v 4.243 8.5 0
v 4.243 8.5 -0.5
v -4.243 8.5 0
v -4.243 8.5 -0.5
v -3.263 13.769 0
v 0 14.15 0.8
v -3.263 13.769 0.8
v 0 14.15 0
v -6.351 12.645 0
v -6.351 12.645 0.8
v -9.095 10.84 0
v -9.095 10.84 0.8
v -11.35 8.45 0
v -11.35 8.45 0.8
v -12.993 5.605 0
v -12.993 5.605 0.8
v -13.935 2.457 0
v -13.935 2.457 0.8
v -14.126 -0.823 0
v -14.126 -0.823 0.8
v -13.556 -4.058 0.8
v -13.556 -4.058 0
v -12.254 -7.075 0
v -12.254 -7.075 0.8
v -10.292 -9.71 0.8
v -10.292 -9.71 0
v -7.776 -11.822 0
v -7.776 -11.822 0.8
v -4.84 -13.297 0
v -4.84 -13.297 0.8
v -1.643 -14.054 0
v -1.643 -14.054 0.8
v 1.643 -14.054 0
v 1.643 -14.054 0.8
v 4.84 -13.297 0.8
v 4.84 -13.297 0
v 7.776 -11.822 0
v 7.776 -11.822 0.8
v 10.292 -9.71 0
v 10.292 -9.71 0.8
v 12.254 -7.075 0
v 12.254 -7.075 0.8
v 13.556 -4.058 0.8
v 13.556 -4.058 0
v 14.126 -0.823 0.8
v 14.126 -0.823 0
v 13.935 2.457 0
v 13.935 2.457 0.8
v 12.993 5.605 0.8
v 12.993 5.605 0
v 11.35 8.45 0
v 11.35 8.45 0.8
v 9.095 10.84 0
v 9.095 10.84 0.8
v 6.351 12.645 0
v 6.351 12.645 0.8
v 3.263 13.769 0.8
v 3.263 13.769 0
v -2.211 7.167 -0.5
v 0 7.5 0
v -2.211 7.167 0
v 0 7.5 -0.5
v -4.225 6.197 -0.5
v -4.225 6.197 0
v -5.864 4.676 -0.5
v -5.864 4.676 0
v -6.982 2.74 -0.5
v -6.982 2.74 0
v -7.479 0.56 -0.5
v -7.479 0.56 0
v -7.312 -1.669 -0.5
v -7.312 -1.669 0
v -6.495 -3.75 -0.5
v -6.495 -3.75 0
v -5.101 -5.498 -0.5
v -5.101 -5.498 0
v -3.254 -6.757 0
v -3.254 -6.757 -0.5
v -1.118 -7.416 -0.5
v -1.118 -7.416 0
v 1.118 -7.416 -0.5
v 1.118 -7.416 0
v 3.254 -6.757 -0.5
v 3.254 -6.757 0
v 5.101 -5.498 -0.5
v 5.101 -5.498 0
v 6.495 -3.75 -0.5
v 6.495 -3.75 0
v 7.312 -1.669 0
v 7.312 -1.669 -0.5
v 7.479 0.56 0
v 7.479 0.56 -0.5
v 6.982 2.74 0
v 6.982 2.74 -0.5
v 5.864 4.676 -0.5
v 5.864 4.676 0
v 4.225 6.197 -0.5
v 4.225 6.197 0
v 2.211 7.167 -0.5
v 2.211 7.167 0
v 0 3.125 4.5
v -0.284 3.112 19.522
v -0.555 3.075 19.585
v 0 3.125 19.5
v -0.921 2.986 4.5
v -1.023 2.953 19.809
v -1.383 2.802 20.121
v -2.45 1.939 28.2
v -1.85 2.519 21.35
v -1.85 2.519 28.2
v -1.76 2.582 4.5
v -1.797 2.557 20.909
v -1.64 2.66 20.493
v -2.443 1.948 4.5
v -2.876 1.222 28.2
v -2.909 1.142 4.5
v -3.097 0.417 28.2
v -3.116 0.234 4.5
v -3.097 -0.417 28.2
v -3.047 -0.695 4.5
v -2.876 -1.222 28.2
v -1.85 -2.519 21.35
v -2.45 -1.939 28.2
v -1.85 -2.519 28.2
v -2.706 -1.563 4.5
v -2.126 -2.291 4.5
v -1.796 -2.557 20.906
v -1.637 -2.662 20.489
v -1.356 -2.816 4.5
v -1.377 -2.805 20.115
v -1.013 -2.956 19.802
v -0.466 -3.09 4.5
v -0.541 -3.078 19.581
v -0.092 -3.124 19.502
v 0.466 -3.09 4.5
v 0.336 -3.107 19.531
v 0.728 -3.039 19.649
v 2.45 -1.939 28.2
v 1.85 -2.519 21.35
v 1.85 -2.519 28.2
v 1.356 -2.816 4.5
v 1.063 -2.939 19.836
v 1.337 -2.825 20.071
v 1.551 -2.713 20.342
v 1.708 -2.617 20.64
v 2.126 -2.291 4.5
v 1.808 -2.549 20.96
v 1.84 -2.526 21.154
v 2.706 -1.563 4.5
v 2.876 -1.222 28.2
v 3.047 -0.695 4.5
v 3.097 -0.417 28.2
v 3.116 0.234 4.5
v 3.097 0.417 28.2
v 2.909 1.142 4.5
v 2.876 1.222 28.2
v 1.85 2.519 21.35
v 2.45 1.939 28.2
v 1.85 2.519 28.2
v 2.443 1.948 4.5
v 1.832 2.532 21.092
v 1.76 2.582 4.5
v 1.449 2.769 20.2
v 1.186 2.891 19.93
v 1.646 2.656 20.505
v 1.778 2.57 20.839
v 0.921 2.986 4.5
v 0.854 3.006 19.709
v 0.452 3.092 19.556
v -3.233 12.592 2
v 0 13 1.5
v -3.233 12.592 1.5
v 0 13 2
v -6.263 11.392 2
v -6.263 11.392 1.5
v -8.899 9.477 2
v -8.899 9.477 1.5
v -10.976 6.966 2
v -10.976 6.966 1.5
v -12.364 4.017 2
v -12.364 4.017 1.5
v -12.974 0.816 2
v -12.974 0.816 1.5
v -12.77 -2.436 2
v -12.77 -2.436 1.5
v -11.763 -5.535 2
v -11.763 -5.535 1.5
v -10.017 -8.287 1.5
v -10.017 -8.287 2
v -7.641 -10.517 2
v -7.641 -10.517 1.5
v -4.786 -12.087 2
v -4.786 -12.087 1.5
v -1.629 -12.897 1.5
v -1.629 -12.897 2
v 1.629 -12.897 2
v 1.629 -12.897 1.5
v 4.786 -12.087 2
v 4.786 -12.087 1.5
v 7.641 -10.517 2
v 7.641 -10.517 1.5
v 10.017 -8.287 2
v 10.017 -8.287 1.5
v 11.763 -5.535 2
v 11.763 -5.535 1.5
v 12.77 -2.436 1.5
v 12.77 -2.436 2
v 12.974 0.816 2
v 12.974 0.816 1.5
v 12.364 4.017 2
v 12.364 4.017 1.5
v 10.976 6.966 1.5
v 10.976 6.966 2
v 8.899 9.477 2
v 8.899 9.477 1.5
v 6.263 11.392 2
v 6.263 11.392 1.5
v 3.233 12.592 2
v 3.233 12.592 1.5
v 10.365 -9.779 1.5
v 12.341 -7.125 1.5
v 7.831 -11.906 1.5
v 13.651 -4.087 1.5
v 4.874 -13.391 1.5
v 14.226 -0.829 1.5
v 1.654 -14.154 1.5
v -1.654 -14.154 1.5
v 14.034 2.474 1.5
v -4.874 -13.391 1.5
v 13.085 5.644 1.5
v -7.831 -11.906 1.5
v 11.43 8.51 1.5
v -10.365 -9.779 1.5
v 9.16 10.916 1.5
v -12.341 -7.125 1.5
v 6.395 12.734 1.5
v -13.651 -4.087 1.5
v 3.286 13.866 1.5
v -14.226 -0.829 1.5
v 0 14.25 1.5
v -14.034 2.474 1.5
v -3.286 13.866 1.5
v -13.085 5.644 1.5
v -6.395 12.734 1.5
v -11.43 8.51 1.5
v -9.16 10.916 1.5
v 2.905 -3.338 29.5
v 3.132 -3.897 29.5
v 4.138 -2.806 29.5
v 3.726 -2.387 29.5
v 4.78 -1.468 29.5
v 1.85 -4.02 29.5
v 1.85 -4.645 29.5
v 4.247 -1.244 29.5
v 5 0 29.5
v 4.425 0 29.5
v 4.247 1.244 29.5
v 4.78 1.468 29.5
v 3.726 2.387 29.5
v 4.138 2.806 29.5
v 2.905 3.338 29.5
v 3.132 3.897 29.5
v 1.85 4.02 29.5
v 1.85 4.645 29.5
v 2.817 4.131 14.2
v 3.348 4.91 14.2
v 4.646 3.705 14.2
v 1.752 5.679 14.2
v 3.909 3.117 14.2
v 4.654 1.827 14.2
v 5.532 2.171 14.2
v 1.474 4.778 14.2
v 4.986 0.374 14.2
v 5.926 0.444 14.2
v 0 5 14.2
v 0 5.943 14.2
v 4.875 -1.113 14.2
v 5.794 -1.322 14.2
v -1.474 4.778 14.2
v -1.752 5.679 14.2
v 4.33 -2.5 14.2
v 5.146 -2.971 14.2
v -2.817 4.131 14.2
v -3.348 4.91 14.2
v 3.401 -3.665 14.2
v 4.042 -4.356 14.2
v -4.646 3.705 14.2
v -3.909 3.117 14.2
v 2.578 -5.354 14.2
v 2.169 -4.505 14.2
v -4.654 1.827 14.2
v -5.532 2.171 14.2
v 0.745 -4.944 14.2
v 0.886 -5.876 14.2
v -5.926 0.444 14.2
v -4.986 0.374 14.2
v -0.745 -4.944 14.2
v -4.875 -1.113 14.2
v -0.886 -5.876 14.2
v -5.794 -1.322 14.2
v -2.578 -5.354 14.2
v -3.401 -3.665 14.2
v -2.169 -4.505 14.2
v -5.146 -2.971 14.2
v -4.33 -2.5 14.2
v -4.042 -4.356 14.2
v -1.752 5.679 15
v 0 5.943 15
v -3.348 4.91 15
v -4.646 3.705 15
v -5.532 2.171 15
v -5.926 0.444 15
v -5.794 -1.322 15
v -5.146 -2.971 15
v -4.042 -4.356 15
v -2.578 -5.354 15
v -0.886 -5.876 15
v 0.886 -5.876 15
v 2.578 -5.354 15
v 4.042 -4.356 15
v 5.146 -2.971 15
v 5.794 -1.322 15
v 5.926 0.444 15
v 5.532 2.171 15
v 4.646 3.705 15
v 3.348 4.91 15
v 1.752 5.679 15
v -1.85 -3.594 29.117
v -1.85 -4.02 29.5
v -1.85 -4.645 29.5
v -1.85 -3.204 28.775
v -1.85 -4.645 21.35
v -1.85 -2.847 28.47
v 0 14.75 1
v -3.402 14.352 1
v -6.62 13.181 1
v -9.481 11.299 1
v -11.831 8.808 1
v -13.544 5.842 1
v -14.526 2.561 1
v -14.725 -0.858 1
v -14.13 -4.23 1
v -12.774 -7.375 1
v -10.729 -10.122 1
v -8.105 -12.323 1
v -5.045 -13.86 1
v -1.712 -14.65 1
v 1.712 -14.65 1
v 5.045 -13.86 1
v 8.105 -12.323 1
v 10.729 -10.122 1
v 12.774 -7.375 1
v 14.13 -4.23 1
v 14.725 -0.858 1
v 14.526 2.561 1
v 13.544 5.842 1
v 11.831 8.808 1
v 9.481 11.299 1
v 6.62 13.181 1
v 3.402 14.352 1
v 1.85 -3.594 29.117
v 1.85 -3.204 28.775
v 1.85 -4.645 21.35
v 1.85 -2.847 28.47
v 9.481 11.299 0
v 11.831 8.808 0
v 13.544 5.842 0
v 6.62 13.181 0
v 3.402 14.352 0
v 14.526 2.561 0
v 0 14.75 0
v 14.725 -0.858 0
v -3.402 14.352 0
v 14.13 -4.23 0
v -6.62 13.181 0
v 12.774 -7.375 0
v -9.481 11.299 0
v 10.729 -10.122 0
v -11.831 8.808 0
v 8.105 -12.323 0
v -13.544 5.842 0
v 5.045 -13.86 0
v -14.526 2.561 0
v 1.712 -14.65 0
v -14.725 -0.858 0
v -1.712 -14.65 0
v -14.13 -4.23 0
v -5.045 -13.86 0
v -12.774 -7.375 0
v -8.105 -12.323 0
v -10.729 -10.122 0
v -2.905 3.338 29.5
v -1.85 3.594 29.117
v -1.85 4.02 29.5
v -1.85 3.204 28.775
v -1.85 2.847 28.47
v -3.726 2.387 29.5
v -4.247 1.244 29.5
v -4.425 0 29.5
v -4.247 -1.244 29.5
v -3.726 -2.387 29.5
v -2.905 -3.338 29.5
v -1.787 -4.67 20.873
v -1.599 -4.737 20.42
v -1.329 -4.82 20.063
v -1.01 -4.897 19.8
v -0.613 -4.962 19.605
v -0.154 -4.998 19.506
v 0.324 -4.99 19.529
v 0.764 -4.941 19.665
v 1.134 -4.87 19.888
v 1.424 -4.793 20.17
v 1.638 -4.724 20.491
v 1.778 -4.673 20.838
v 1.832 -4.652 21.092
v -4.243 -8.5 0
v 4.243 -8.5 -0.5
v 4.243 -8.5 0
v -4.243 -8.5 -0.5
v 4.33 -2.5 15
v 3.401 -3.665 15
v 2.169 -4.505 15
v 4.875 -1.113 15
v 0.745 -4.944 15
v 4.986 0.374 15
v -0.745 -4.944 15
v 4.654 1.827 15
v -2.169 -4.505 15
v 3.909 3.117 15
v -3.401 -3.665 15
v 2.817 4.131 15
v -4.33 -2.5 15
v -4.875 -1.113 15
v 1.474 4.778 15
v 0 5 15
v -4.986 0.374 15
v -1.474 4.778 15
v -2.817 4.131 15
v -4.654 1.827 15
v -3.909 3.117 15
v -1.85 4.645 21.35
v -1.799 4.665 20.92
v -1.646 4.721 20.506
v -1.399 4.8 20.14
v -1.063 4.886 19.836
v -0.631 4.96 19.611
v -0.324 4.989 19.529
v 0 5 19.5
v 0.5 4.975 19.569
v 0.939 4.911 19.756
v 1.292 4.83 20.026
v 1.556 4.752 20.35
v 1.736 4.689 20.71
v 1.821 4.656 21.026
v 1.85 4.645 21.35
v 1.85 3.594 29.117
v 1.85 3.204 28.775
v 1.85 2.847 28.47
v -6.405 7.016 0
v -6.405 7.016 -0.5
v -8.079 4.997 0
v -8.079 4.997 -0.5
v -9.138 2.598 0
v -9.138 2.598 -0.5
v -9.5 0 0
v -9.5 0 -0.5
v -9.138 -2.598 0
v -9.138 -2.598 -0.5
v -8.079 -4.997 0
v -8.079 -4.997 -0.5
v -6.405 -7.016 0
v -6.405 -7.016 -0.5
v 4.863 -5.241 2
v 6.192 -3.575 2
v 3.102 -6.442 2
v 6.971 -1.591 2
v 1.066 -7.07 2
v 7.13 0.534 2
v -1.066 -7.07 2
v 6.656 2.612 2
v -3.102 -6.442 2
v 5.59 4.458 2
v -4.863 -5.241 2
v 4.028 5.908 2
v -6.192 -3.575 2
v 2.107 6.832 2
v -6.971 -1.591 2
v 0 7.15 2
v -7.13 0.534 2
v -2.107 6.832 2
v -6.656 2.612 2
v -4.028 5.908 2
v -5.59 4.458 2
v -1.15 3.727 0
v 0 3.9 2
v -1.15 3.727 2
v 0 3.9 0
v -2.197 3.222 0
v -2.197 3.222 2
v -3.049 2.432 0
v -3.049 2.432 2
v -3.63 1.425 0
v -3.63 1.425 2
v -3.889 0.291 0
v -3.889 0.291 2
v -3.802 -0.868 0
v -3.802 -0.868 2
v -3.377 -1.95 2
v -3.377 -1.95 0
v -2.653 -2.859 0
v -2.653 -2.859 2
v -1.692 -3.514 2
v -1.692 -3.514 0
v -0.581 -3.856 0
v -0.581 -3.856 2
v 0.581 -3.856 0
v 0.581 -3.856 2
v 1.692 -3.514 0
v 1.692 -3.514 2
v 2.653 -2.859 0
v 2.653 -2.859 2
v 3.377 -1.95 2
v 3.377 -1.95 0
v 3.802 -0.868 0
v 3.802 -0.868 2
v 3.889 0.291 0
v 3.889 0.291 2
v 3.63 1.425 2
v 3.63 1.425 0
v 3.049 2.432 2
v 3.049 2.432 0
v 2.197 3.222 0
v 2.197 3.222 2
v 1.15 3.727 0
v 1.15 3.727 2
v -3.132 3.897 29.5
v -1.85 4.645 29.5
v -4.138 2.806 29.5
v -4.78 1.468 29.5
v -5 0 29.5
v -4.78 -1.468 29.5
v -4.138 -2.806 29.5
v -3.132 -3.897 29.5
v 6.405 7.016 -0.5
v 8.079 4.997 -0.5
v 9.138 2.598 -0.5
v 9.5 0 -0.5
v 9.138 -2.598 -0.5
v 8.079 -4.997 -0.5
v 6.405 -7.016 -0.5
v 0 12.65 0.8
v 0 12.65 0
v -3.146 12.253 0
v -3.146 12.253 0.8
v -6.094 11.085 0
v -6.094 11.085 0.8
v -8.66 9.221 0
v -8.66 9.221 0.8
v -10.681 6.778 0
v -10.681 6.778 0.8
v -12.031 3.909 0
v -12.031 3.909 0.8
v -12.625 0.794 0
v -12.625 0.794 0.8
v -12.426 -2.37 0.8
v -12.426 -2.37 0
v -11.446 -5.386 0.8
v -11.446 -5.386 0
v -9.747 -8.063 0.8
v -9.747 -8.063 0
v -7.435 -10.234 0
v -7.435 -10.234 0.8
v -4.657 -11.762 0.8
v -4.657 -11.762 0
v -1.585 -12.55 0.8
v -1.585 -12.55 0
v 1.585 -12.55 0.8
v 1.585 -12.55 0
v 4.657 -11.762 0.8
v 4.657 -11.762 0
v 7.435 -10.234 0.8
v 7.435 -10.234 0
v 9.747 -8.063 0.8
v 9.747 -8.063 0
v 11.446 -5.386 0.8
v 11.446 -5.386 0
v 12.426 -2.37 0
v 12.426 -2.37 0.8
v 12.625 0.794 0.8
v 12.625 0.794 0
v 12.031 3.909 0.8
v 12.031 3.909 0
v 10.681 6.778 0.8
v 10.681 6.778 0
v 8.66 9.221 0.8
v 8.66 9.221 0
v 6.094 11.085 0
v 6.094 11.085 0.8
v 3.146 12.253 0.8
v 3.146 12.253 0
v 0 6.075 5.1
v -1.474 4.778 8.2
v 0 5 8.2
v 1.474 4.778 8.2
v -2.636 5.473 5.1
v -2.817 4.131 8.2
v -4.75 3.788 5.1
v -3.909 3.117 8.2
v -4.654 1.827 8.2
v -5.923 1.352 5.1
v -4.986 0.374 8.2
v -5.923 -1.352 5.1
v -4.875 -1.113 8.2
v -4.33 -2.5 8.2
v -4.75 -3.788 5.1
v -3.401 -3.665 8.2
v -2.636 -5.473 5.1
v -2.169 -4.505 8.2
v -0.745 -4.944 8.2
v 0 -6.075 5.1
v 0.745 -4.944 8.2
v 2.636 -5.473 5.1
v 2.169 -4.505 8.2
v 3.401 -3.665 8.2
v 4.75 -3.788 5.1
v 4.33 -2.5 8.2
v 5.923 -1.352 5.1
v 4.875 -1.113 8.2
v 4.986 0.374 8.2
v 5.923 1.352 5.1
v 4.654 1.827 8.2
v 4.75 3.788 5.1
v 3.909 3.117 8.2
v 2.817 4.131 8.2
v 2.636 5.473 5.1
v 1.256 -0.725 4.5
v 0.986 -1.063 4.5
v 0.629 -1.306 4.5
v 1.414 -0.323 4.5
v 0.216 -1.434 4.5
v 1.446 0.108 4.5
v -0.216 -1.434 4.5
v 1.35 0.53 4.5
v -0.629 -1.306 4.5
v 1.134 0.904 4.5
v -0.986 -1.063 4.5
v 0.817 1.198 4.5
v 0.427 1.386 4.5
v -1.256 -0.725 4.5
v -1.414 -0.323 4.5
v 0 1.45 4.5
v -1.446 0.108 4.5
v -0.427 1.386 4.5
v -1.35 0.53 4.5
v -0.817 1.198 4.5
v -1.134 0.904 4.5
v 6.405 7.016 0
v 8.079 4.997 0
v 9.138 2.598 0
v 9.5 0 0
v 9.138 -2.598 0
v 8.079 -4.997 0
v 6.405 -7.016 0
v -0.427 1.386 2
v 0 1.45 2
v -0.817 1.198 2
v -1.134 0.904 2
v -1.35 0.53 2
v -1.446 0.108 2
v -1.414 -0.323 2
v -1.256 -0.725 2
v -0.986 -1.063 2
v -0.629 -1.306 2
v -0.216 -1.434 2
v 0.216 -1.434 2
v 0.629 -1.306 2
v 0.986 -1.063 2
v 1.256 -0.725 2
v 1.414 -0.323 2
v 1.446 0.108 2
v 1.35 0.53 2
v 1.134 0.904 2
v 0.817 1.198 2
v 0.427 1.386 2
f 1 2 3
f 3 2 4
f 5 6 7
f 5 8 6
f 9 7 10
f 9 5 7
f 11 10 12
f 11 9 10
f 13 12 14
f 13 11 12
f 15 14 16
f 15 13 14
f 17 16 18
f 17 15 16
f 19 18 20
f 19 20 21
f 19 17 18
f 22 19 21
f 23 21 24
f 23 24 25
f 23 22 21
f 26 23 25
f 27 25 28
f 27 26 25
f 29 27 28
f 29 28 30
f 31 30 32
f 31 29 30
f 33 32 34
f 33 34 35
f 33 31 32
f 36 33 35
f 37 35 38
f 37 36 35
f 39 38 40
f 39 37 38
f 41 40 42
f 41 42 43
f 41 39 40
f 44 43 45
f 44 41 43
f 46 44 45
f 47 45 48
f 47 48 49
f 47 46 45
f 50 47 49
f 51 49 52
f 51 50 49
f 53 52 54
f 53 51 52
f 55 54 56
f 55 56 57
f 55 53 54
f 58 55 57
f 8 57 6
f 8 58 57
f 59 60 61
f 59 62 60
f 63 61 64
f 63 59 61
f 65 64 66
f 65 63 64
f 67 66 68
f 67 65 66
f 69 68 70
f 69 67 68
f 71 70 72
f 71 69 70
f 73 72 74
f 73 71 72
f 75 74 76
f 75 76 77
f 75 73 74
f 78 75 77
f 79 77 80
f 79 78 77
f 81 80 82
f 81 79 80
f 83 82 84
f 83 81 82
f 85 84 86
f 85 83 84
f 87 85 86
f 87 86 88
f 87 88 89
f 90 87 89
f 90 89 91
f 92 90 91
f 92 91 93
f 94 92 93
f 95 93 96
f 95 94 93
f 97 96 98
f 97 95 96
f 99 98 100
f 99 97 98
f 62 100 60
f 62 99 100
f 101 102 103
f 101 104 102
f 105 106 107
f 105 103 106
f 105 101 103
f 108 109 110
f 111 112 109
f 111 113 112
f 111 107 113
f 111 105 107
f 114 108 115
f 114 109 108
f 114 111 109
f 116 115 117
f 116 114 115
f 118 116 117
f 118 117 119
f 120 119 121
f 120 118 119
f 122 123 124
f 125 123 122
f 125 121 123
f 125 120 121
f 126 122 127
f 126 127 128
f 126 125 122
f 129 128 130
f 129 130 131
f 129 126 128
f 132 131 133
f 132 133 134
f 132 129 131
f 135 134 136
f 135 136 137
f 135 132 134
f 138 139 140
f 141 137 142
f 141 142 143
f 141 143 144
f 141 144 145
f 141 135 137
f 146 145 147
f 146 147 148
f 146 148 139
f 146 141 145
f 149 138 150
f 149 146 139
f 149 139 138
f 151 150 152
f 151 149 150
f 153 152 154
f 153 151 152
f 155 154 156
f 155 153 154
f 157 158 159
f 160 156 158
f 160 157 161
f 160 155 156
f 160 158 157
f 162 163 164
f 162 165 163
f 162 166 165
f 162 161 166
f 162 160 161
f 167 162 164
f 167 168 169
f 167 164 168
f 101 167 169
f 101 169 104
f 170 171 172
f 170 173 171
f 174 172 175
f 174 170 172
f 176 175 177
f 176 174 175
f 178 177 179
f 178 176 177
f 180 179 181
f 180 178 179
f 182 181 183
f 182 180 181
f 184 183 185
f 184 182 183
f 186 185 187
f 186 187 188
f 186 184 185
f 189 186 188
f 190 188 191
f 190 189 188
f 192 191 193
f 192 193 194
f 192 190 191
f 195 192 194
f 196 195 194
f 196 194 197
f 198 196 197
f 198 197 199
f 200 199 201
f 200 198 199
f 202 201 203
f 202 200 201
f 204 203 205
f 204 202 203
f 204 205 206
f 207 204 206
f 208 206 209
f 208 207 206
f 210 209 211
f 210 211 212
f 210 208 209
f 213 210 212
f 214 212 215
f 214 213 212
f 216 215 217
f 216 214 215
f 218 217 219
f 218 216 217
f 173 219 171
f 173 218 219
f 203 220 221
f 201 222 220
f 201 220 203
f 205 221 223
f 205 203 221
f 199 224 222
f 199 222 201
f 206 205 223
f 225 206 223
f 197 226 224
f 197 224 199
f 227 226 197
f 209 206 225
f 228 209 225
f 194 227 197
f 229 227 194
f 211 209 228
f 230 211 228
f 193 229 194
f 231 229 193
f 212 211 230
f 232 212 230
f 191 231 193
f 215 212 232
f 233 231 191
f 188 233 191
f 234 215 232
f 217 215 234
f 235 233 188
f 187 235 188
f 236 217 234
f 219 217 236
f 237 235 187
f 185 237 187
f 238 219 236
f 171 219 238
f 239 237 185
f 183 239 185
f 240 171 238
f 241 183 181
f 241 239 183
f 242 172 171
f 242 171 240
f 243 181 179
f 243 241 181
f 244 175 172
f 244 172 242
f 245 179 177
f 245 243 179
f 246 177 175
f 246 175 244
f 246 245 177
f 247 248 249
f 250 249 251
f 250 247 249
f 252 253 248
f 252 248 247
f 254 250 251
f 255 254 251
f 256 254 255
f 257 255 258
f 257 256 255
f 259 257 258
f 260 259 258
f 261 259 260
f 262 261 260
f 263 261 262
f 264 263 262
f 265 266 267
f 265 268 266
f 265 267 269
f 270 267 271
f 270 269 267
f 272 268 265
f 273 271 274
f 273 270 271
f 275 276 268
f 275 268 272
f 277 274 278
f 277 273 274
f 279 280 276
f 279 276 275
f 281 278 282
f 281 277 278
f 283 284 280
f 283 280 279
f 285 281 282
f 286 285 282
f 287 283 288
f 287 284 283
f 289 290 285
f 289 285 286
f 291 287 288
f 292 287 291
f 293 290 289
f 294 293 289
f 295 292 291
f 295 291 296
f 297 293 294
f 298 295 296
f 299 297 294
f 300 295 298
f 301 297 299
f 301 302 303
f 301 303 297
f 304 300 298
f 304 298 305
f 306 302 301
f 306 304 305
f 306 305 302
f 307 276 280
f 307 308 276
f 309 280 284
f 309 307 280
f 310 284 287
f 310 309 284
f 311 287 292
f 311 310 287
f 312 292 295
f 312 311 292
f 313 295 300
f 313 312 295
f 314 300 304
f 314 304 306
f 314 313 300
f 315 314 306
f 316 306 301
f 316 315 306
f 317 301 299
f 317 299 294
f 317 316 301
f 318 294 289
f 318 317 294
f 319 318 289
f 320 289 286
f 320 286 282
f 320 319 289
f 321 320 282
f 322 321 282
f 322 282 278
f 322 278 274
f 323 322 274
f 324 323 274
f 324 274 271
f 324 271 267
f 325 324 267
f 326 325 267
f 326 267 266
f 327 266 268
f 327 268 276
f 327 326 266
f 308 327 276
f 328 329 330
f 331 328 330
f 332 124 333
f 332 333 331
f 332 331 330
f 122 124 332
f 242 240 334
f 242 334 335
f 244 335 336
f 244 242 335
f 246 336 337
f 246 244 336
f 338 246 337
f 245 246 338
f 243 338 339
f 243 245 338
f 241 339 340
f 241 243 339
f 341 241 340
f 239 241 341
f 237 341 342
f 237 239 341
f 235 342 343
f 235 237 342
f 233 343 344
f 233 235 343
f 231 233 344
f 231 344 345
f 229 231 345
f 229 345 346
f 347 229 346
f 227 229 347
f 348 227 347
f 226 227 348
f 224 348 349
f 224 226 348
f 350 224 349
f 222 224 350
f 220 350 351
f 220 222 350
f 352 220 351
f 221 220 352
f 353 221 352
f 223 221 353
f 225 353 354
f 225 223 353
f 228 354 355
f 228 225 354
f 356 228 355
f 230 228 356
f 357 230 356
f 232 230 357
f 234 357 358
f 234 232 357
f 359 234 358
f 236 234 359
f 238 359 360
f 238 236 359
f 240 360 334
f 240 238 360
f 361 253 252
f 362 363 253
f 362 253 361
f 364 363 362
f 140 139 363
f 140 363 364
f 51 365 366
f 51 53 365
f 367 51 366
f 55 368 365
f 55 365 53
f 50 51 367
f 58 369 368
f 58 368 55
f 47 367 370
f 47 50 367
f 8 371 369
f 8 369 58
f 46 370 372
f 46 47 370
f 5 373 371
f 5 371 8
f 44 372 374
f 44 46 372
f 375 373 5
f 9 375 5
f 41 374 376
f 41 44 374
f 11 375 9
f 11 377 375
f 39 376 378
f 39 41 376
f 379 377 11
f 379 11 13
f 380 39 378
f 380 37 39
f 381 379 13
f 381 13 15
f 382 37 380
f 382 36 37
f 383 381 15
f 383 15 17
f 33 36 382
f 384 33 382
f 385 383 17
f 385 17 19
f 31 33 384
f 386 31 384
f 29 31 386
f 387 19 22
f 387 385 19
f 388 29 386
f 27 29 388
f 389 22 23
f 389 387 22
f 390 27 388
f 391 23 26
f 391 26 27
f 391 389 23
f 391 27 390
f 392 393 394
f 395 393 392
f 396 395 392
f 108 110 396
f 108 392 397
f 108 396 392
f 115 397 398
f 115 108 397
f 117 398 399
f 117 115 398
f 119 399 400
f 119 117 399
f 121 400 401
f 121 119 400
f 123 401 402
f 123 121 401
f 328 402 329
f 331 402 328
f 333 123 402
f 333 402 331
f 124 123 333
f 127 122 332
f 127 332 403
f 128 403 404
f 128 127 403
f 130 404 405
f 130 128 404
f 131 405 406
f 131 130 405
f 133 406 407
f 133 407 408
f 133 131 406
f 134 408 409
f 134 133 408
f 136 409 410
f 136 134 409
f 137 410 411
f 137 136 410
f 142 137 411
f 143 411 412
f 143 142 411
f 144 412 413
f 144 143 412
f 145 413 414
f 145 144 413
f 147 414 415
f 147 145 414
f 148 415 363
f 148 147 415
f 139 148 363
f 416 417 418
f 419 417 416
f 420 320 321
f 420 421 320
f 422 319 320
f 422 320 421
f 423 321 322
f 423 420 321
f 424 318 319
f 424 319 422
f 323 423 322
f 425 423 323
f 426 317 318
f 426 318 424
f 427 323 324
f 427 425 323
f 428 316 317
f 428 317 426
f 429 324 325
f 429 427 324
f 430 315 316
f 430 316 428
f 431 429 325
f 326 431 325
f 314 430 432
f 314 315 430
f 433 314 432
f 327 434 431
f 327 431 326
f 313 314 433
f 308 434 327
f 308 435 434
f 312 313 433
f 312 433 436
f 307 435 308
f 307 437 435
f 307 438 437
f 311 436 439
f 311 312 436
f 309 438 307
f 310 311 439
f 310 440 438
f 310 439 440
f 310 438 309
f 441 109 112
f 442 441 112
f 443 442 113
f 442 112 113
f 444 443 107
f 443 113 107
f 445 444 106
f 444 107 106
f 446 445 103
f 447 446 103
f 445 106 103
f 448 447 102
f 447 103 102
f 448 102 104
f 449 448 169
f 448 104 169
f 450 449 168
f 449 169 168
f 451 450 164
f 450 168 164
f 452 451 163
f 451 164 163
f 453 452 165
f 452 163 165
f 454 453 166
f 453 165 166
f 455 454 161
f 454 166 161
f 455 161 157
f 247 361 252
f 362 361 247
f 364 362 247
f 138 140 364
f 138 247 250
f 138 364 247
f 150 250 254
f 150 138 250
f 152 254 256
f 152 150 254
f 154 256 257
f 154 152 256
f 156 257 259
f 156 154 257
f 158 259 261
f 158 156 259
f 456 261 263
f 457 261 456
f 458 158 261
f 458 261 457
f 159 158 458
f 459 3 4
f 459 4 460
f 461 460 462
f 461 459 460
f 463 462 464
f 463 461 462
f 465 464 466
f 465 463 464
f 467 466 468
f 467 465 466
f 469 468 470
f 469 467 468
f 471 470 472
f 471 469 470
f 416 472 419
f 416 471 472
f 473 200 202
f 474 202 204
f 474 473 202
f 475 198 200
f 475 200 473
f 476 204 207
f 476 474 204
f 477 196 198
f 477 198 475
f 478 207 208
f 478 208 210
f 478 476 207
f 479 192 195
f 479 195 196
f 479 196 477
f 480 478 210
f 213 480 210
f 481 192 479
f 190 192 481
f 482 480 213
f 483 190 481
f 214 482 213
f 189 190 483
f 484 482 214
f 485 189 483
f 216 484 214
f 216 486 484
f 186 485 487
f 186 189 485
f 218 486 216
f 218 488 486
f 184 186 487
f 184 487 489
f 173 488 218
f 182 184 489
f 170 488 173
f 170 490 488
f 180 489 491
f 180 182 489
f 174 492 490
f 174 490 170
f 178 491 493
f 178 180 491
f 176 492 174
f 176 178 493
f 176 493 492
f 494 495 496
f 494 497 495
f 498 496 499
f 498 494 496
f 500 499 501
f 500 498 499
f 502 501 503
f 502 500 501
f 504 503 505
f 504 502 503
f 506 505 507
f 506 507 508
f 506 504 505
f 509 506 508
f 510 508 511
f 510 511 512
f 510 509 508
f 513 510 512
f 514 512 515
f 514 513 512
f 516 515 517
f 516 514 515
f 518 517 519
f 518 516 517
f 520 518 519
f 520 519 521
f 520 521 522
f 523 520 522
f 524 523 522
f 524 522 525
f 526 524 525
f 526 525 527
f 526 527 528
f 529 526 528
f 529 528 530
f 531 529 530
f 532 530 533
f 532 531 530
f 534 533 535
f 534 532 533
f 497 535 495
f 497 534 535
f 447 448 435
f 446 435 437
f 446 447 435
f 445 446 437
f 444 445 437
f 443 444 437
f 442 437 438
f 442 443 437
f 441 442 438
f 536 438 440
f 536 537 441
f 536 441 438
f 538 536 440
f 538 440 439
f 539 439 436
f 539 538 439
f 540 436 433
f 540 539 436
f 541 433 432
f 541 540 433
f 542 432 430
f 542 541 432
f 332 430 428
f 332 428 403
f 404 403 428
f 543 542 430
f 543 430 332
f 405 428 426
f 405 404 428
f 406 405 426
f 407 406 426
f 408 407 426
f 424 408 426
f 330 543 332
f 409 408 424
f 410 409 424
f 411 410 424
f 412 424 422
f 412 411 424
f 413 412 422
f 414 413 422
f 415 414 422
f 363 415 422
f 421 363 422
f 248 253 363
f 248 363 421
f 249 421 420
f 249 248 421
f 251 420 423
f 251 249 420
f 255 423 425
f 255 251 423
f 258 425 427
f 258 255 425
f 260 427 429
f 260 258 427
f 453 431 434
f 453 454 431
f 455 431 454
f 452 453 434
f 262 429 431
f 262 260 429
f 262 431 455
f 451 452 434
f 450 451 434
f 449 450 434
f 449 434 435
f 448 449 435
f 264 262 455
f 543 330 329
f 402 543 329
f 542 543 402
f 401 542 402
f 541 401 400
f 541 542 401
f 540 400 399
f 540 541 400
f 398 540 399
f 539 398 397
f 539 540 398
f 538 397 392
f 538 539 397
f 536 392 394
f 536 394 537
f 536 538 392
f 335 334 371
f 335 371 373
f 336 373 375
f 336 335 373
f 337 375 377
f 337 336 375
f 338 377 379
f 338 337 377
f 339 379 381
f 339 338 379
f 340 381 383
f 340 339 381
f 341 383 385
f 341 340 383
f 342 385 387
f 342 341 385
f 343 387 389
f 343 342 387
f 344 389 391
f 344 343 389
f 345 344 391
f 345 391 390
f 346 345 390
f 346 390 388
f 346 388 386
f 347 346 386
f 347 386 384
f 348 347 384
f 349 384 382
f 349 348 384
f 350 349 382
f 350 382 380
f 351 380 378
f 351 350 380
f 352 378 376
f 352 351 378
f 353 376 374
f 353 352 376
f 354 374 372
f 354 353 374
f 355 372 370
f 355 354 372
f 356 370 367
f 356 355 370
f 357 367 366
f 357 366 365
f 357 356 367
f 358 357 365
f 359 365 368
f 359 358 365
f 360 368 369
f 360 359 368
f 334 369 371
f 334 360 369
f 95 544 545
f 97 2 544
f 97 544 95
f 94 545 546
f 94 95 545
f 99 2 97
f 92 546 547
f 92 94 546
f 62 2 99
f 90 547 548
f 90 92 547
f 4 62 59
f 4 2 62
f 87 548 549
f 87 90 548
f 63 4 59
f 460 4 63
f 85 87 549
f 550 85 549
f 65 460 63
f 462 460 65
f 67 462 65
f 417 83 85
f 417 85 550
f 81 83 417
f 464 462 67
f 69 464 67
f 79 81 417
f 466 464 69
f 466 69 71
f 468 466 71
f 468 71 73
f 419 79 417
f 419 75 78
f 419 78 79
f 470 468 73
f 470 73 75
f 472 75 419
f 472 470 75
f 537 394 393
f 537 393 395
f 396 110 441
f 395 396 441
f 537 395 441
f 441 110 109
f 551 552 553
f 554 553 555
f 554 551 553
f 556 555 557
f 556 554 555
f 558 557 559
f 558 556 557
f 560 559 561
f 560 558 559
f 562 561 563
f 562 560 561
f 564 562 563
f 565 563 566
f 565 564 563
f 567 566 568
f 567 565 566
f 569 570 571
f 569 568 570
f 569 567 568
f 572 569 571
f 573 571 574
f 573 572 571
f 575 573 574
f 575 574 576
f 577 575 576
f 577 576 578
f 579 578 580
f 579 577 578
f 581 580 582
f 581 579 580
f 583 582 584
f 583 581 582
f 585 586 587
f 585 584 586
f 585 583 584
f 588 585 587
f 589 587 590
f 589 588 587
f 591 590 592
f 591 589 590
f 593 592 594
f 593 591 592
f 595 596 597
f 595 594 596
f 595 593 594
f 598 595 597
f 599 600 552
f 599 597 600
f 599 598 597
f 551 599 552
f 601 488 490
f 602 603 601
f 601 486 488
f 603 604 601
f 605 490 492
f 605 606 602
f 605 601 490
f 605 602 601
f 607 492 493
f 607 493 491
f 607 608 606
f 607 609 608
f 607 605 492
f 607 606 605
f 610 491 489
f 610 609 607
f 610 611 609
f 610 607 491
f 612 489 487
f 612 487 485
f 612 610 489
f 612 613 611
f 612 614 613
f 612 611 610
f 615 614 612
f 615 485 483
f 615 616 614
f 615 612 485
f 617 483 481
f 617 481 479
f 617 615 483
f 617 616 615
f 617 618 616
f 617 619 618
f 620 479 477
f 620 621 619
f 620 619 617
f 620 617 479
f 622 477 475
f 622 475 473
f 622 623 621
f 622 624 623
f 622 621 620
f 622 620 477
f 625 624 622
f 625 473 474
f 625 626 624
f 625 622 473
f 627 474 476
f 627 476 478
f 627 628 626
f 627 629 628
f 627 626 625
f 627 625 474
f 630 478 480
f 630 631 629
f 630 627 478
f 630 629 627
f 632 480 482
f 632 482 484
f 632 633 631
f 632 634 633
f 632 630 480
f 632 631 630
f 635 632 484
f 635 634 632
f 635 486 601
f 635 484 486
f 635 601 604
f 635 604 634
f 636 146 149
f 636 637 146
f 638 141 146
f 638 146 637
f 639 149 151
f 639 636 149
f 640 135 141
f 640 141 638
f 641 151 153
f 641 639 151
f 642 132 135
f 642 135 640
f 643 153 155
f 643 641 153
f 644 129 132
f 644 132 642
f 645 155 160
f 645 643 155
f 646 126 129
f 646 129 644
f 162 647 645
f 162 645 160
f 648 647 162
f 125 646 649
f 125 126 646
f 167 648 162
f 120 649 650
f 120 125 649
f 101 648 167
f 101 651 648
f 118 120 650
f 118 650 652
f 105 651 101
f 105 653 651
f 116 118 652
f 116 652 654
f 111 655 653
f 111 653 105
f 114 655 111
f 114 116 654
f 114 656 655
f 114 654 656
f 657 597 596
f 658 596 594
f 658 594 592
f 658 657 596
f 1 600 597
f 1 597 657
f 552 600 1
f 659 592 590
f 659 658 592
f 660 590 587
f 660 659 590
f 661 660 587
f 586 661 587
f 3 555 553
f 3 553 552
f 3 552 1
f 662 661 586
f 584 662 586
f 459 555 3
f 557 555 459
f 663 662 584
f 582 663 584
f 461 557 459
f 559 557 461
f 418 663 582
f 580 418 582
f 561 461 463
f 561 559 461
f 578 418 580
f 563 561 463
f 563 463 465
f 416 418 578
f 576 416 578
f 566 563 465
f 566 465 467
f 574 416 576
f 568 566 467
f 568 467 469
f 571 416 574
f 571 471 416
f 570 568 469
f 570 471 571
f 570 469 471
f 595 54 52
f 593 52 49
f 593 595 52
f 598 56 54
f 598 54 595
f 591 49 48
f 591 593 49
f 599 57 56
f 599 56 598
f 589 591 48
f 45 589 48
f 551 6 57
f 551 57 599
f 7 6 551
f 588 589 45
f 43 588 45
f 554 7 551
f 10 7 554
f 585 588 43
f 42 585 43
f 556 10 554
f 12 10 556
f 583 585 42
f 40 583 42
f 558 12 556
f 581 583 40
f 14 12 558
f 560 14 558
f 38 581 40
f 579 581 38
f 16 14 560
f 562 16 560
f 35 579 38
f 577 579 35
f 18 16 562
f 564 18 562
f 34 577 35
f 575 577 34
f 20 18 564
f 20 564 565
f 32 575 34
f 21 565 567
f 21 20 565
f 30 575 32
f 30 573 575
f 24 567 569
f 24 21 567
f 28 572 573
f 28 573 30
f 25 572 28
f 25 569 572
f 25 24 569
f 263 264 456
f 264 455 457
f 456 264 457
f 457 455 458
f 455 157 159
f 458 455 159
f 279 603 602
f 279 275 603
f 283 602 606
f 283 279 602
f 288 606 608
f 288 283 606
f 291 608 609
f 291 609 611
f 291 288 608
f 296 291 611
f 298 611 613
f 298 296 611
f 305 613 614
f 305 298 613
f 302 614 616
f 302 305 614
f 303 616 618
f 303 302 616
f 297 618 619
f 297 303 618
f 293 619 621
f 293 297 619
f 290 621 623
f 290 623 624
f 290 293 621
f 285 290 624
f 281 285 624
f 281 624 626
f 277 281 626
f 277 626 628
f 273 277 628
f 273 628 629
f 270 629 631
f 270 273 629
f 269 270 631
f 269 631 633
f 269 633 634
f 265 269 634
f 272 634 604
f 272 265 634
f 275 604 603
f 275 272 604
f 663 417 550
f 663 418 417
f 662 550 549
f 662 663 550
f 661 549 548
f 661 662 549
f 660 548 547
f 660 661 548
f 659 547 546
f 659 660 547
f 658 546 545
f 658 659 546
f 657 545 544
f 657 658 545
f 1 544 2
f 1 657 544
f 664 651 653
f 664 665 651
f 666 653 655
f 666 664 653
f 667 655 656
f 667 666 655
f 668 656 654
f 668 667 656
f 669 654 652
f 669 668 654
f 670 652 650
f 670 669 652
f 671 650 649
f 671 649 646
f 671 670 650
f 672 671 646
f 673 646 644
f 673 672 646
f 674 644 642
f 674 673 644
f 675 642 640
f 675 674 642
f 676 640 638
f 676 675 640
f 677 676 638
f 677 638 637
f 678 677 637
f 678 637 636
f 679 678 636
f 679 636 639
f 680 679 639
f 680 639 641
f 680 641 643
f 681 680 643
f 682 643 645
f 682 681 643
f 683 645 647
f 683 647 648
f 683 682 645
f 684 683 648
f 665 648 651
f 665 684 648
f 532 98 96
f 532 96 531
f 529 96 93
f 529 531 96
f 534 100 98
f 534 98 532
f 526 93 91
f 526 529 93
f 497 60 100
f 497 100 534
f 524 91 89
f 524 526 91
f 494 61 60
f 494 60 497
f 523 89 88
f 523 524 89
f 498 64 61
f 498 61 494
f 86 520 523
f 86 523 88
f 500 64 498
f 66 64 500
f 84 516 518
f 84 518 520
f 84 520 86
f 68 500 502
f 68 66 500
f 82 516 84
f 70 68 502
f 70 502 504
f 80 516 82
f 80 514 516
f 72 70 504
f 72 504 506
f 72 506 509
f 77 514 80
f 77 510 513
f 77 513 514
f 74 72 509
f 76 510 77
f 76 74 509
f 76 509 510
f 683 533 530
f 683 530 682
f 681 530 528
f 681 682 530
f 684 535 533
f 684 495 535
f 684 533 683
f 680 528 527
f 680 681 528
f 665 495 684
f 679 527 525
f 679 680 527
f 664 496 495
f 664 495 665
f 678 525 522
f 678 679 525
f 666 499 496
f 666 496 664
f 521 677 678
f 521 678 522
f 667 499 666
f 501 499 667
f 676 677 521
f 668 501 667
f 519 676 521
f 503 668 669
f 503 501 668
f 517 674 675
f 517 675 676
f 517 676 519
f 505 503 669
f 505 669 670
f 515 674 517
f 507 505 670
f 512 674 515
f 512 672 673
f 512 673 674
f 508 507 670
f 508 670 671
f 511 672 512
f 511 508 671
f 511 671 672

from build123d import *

# Parameters (mm, degrees)
FASE1_SIZE                           = 0.5
FASE2_SIZE                           = 1.3
SCHNITT_LINEAR_AUSTRAGEN1_DEPTH      = 15.75
SCHNITT_LINEAR_AUSTRAGEN1_DEPTH_BACK = 15.75
SKIZZE4_OUTSIDE_W                    = 41.778
SKIZZE4_OUTSIDE_H                    = 41.778
SKIZZE4_OUTSIDE_W_2                  = 20
SKIZZE4_OUTSIDE_H_2                  = 17
SCHNITT_LINEAR_AUSTRAGEN2_DEPTH      = 0.5


with BuildPart() as part:
    # Skizze2 → Rotation1 (revolve)
    with BuildSketch(Plane(origin=(0, 0, 0), x_dir=(0, 0, -1), z_dir=(1, 0, 0))):
        Polygon((0, 14.75), (-1.5, 14.75), (-1.5, 13), (-2, 13), (-2, 7.15), (-8.2, 5), (-14.2, 5), (-14.2, 5.942548531), (-15, 5.942548531), (-15, 5), (-29.5, 5), (-29.5, 3.125), (-4.5, 3.125), (-4.5, 1.45), (-2, 1.45), (-2, 3.9), (0, 3.9), (0, 7.5), (0.5, 7.5), (0.5, 9.5), (0, 9.5), (0, 12.65), (-0.8, 12.65), (-0.8, 14.15), (0, 14.15), align=None)
    revolve(axis=Axis((0, 0, -10.606367747), (0, 0, 1)))

    # Fase1
    fase1_edges = [part.edges().sort_by_distance(p)[0] for p in [
        (0, -14.75, 1.5),
    ]]
    chamfer(fase1_edges, length=FASE1_SIZE)

    # Fase2
    fase2_edges = [part.edges().sort_by_distance(p)[0] for p in [
        (0, -3.125, 29.5),
    ]]
    chamfer(fase2_edges, length=FASE2_SIZE)

    # Skizze3 → Schnitt-Linear austragen1 (cut, two sides)
    with BuildSketch(Plane(origin=(0, 0, 0), x_dir=(1, 0, 0), z_dir=(0, 1, 0))) as schnitt_linear_austragen1_sk:
        with BuildLine():
            Line((1.85, -21.35), (1.85, -29.5))
            ThreePointArc((1.85, -29.5), (0, -31.35), (-1.85, -29.5))
            Line((-1.85, -29.5), (-1.85, -21.35))
            ThreePointArc((-1.85, -21.35), (0, -19.5), (1.85, -21.35))
        make_face()
    extrude(amount=SCHNITT_LINEAR_AUSTRAGEN1_DEPTH, mode=Mode.SUBTRACT)
    extrude(schnitt_linear_austragen1_sk.sketch, amount=-SCHNITT_LINEAR_AUSTRAGEN1_DEPTH_BACK, mode=Mode.SUBTRACT)

    # Skizze4 outside → Schnitt-Linear austragen2 (cut)
    with BuildSketch(Plane(origin=(0, 0, -0.5), x_dir=(-1, 0, 0), z_dir=(0, 0, -1))):
        Rectangle(SKIZZE4_OUTSIDE_W, SKIZZE4_OUTSIDE_H)
        Rectangle(SKIZZE4_OUTSIDE_W_2, SKIZZE4_OUTSIDE_H_2, mode=Mode.SUBTRACT)
    extrude(amount=-SCHNITT_LINEAR_AUSTRAGEN2_DEPTH, mode=Mode.SUBTRACT)


solid = part.part
